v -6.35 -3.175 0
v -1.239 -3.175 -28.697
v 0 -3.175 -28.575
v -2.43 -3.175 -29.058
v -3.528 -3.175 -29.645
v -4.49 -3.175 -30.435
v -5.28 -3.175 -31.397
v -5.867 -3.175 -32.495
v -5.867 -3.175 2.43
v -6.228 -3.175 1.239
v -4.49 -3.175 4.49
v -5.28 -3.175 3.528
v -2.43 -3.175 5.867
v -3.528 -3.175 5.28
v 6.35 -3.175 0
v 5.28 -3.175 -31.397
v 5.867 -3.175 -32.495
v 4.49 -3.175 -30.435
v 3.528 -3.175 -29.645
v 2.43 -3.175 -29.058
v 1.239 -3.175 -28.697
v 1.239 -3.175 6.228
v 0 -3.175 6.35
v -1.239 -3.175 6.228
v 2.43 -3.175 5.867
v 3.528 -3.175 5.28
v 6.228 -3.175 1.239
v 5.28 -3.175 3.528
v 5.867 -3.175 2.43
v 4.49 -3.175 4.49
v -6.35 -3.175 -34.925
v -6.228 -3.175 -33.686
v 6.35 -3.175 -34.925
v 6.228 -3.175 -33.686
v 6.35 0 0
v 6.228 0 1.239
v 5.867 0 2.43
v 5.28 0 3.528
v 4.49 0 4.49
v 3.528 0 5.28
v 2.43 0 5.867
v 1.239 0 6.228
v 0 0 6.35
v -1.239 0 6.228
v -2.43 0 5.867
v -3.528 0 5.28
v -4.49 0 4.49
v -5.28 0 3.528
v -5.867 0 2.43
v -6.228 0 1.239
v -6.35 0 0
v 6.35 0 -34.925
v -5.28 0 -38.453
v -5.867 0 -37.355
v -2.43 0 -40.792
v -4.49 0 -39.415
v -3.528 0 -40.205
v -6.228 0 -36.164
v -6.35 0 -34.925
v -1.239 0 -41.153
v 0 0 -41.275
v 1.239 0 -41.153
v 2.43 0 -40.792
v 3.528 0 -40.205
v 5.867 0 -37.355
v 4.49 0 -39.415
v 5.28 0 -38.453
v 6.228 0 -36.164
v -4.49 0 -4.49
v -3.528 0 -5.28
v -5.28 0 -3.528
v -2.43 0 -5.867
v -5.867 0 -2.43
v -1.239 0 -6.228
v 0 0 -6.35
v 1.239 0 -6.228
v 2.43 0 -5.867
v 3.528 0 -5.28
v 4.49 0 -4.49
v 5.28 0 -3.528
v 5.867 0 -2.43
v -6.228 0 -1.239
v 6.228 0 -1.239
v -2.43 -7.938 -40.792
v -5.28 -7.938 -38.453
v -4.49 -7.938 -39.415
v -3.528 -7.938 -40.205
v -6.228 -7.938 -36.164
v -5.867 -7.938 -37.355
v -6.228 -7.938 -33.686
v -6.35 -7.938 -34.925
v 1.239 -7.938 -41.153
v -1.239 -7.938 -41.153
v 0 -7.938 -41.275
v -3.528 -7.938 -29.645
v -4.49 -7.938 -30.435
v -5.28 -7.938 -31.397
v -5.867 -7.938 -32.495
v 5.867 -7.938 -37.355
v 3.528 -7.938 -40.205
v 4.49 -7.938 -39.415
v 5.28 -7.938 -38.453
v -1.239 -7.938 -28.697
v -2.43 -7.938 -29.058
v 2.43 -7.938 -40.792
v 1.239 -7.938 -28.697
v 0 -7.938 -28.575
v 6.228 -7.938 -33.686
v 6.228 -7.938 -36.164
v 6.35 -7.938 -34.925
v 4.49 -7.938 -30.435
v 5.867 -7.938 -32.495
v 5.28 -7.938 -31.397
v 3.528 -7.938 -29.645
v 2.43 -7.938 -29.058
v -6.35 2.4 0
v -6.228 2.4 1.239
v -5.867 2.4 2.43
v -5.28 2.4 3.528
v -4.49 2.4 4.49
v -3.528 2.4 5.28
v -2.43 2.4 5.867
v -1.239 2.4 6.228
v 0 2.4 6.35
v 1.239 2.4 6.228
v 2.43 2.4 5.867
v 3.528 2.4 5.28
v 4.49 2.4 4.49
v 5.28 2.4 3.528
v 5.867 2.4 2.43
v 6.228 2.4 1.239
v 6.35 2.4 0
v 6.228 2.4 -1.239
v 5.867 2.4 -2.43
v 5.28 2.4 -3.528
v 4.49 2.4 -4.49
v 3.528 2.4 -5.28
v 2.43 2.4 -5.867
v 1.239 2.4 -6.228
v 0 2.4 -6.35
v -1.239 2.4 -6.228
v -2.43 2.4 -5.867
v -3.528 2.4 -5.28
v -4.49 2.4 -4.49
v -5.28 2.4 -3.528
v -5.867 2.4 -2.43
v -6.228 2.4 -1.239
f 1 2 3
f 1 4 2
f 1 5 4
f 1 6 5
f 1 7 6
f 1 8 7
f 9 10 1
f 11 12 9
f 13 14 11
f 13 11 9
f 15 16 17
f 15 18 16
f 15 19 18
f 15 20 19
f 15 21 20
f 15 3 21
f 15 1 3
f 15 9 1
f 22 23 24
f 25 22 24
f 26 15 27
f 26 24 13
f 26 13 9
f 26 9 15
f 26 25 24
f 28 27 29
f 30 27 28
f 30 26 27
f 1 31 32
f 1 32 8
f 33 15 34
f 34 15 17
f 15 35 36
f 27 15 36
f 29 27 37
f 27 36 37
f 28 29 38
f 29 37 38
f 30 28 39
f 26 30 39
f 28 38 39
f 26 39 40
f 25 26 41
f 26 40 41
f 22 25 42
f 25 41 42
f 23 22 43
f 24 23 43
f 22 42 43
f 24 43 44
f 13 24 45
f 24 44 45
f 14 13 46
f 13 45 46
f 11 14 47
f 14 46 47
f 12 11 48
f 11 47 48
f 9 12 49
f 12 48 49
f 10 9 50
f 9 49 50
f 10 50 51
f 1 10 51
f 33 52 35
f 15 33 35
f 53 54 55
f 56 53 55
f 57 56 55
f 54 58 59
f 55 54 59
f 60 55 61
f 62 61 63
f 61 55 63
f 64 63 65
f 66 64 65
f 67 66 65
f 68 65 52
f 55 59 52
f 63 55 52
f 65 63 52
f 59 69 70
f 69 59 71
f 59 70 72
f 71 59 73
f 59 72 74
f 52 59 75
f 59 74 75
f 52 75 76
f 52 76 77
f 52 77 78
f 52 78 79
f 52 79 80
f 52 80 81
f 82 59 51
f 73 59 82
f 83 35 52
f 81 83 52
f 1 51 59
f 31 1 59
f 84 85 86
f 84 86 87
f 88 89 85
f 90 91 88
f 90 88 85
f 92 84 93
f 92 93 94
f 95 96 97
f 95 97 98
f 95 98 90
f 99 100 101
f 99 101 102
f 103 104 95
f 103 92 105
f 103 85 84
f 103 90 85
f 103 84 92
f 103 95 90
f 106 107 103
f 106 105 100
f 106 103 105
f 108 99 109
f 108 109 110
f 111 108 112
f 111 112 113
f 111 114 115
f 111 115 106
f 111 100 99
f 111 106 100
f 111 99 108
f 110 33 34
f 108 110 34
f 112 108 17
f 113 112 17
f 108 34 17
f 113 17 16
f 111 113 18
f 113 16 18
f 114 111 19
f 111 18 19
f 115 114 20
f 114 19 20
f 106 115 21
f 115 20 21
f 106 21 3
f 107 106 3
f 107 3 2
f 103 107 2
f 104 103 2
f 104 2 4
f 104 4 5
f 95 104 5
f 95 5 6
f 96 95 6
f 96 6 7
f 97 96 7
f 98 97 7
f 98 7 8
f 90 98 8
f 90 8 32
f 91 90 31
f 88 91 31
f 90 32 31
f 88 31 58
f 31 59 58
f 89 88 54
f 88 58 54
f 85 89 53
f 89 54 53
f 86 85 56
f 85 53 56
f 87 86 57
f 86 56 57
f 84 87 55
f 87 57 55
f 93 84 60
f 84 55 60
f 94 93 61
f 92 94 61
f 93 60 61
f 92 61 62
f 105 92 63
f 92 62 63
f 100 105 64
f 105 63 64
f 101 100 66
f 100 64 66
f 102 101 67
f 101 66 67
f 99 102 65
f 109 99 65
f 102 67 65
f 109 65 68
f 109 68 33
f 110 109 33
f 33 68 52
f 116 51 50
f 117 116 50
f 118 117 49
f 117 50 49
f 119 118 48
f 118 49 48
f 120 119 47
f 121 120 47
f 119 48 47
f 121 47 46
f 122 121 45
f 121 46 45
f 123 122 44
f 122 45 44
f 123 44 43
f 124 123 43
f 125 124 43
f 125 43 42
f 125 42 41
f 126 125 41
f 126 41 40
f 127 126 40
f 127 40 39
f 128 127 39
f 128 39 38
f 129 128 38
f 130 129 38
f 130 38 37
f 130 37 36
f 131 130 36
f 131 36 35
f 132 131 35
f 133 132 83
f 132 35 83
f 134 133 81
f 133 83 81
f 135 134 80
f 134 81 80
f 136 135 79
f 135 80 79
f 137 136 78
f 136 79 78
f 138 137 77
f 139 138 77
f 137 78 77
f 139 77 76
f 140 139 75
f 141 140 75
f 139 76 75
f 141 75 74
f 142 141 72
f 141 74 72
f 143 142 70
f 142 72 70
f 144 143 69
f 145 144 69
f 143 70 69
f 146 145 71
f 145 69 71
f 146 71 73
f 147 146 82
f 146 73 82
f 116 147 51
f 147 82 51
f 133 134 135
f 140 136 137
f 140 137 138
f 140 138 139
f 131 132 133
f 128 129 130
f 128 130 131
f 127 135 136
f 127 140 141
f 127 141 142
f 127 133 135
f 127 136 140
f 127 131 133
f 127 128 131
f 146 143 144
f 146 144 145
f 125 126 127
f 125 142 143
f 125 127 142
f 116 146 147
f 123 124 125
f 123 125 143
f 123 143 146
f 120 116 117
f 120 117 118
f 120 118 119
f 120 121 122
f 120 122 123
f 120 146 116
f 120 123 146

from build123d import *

# Parameters (mm, degrees)
F1_DEPTH = 3.175
F2_R     = 6.35
F3_DEPTH = 2.4
F4_R     = 6.35
F5_DEPTH = 4.7625


with BuildPart() as f1:
    # F0 (on Front) → F1 (new body)
    with BuildSketch(Plane.XZ):
        with BuildLine():
            Line((-6.35, 0), (-6.35, -34.925))
            ThreePointArc((-6.35, -34.925), (0, -41.275), (6.35, -34.925))
            Line((6.35, -34.925), (6.35, 0))
            ThreePointArc((6.35, 0), (0, 6.35), (-6.35, 0))
        make_face()
    extrude(amount=F1_DEPTH)

    # F2 (on face) → F3 (join)
    with BuildSketch(Plane(origin=(0, 0, 0), x_dir=(-1, 0, 0), z_dir=(0, 1, 0))):
        Circle(F2_R)
    extrude(amount=F3_DEPTH)

    # F4 (on face) → F5 (join)
    with BuildSketch(Plane.XZ.offset(3.175)):
        with Locations((0, -34.925)):
            Circle(F4_R)
    extrude(amount=F5_DEPTH)


solid = f1.part
